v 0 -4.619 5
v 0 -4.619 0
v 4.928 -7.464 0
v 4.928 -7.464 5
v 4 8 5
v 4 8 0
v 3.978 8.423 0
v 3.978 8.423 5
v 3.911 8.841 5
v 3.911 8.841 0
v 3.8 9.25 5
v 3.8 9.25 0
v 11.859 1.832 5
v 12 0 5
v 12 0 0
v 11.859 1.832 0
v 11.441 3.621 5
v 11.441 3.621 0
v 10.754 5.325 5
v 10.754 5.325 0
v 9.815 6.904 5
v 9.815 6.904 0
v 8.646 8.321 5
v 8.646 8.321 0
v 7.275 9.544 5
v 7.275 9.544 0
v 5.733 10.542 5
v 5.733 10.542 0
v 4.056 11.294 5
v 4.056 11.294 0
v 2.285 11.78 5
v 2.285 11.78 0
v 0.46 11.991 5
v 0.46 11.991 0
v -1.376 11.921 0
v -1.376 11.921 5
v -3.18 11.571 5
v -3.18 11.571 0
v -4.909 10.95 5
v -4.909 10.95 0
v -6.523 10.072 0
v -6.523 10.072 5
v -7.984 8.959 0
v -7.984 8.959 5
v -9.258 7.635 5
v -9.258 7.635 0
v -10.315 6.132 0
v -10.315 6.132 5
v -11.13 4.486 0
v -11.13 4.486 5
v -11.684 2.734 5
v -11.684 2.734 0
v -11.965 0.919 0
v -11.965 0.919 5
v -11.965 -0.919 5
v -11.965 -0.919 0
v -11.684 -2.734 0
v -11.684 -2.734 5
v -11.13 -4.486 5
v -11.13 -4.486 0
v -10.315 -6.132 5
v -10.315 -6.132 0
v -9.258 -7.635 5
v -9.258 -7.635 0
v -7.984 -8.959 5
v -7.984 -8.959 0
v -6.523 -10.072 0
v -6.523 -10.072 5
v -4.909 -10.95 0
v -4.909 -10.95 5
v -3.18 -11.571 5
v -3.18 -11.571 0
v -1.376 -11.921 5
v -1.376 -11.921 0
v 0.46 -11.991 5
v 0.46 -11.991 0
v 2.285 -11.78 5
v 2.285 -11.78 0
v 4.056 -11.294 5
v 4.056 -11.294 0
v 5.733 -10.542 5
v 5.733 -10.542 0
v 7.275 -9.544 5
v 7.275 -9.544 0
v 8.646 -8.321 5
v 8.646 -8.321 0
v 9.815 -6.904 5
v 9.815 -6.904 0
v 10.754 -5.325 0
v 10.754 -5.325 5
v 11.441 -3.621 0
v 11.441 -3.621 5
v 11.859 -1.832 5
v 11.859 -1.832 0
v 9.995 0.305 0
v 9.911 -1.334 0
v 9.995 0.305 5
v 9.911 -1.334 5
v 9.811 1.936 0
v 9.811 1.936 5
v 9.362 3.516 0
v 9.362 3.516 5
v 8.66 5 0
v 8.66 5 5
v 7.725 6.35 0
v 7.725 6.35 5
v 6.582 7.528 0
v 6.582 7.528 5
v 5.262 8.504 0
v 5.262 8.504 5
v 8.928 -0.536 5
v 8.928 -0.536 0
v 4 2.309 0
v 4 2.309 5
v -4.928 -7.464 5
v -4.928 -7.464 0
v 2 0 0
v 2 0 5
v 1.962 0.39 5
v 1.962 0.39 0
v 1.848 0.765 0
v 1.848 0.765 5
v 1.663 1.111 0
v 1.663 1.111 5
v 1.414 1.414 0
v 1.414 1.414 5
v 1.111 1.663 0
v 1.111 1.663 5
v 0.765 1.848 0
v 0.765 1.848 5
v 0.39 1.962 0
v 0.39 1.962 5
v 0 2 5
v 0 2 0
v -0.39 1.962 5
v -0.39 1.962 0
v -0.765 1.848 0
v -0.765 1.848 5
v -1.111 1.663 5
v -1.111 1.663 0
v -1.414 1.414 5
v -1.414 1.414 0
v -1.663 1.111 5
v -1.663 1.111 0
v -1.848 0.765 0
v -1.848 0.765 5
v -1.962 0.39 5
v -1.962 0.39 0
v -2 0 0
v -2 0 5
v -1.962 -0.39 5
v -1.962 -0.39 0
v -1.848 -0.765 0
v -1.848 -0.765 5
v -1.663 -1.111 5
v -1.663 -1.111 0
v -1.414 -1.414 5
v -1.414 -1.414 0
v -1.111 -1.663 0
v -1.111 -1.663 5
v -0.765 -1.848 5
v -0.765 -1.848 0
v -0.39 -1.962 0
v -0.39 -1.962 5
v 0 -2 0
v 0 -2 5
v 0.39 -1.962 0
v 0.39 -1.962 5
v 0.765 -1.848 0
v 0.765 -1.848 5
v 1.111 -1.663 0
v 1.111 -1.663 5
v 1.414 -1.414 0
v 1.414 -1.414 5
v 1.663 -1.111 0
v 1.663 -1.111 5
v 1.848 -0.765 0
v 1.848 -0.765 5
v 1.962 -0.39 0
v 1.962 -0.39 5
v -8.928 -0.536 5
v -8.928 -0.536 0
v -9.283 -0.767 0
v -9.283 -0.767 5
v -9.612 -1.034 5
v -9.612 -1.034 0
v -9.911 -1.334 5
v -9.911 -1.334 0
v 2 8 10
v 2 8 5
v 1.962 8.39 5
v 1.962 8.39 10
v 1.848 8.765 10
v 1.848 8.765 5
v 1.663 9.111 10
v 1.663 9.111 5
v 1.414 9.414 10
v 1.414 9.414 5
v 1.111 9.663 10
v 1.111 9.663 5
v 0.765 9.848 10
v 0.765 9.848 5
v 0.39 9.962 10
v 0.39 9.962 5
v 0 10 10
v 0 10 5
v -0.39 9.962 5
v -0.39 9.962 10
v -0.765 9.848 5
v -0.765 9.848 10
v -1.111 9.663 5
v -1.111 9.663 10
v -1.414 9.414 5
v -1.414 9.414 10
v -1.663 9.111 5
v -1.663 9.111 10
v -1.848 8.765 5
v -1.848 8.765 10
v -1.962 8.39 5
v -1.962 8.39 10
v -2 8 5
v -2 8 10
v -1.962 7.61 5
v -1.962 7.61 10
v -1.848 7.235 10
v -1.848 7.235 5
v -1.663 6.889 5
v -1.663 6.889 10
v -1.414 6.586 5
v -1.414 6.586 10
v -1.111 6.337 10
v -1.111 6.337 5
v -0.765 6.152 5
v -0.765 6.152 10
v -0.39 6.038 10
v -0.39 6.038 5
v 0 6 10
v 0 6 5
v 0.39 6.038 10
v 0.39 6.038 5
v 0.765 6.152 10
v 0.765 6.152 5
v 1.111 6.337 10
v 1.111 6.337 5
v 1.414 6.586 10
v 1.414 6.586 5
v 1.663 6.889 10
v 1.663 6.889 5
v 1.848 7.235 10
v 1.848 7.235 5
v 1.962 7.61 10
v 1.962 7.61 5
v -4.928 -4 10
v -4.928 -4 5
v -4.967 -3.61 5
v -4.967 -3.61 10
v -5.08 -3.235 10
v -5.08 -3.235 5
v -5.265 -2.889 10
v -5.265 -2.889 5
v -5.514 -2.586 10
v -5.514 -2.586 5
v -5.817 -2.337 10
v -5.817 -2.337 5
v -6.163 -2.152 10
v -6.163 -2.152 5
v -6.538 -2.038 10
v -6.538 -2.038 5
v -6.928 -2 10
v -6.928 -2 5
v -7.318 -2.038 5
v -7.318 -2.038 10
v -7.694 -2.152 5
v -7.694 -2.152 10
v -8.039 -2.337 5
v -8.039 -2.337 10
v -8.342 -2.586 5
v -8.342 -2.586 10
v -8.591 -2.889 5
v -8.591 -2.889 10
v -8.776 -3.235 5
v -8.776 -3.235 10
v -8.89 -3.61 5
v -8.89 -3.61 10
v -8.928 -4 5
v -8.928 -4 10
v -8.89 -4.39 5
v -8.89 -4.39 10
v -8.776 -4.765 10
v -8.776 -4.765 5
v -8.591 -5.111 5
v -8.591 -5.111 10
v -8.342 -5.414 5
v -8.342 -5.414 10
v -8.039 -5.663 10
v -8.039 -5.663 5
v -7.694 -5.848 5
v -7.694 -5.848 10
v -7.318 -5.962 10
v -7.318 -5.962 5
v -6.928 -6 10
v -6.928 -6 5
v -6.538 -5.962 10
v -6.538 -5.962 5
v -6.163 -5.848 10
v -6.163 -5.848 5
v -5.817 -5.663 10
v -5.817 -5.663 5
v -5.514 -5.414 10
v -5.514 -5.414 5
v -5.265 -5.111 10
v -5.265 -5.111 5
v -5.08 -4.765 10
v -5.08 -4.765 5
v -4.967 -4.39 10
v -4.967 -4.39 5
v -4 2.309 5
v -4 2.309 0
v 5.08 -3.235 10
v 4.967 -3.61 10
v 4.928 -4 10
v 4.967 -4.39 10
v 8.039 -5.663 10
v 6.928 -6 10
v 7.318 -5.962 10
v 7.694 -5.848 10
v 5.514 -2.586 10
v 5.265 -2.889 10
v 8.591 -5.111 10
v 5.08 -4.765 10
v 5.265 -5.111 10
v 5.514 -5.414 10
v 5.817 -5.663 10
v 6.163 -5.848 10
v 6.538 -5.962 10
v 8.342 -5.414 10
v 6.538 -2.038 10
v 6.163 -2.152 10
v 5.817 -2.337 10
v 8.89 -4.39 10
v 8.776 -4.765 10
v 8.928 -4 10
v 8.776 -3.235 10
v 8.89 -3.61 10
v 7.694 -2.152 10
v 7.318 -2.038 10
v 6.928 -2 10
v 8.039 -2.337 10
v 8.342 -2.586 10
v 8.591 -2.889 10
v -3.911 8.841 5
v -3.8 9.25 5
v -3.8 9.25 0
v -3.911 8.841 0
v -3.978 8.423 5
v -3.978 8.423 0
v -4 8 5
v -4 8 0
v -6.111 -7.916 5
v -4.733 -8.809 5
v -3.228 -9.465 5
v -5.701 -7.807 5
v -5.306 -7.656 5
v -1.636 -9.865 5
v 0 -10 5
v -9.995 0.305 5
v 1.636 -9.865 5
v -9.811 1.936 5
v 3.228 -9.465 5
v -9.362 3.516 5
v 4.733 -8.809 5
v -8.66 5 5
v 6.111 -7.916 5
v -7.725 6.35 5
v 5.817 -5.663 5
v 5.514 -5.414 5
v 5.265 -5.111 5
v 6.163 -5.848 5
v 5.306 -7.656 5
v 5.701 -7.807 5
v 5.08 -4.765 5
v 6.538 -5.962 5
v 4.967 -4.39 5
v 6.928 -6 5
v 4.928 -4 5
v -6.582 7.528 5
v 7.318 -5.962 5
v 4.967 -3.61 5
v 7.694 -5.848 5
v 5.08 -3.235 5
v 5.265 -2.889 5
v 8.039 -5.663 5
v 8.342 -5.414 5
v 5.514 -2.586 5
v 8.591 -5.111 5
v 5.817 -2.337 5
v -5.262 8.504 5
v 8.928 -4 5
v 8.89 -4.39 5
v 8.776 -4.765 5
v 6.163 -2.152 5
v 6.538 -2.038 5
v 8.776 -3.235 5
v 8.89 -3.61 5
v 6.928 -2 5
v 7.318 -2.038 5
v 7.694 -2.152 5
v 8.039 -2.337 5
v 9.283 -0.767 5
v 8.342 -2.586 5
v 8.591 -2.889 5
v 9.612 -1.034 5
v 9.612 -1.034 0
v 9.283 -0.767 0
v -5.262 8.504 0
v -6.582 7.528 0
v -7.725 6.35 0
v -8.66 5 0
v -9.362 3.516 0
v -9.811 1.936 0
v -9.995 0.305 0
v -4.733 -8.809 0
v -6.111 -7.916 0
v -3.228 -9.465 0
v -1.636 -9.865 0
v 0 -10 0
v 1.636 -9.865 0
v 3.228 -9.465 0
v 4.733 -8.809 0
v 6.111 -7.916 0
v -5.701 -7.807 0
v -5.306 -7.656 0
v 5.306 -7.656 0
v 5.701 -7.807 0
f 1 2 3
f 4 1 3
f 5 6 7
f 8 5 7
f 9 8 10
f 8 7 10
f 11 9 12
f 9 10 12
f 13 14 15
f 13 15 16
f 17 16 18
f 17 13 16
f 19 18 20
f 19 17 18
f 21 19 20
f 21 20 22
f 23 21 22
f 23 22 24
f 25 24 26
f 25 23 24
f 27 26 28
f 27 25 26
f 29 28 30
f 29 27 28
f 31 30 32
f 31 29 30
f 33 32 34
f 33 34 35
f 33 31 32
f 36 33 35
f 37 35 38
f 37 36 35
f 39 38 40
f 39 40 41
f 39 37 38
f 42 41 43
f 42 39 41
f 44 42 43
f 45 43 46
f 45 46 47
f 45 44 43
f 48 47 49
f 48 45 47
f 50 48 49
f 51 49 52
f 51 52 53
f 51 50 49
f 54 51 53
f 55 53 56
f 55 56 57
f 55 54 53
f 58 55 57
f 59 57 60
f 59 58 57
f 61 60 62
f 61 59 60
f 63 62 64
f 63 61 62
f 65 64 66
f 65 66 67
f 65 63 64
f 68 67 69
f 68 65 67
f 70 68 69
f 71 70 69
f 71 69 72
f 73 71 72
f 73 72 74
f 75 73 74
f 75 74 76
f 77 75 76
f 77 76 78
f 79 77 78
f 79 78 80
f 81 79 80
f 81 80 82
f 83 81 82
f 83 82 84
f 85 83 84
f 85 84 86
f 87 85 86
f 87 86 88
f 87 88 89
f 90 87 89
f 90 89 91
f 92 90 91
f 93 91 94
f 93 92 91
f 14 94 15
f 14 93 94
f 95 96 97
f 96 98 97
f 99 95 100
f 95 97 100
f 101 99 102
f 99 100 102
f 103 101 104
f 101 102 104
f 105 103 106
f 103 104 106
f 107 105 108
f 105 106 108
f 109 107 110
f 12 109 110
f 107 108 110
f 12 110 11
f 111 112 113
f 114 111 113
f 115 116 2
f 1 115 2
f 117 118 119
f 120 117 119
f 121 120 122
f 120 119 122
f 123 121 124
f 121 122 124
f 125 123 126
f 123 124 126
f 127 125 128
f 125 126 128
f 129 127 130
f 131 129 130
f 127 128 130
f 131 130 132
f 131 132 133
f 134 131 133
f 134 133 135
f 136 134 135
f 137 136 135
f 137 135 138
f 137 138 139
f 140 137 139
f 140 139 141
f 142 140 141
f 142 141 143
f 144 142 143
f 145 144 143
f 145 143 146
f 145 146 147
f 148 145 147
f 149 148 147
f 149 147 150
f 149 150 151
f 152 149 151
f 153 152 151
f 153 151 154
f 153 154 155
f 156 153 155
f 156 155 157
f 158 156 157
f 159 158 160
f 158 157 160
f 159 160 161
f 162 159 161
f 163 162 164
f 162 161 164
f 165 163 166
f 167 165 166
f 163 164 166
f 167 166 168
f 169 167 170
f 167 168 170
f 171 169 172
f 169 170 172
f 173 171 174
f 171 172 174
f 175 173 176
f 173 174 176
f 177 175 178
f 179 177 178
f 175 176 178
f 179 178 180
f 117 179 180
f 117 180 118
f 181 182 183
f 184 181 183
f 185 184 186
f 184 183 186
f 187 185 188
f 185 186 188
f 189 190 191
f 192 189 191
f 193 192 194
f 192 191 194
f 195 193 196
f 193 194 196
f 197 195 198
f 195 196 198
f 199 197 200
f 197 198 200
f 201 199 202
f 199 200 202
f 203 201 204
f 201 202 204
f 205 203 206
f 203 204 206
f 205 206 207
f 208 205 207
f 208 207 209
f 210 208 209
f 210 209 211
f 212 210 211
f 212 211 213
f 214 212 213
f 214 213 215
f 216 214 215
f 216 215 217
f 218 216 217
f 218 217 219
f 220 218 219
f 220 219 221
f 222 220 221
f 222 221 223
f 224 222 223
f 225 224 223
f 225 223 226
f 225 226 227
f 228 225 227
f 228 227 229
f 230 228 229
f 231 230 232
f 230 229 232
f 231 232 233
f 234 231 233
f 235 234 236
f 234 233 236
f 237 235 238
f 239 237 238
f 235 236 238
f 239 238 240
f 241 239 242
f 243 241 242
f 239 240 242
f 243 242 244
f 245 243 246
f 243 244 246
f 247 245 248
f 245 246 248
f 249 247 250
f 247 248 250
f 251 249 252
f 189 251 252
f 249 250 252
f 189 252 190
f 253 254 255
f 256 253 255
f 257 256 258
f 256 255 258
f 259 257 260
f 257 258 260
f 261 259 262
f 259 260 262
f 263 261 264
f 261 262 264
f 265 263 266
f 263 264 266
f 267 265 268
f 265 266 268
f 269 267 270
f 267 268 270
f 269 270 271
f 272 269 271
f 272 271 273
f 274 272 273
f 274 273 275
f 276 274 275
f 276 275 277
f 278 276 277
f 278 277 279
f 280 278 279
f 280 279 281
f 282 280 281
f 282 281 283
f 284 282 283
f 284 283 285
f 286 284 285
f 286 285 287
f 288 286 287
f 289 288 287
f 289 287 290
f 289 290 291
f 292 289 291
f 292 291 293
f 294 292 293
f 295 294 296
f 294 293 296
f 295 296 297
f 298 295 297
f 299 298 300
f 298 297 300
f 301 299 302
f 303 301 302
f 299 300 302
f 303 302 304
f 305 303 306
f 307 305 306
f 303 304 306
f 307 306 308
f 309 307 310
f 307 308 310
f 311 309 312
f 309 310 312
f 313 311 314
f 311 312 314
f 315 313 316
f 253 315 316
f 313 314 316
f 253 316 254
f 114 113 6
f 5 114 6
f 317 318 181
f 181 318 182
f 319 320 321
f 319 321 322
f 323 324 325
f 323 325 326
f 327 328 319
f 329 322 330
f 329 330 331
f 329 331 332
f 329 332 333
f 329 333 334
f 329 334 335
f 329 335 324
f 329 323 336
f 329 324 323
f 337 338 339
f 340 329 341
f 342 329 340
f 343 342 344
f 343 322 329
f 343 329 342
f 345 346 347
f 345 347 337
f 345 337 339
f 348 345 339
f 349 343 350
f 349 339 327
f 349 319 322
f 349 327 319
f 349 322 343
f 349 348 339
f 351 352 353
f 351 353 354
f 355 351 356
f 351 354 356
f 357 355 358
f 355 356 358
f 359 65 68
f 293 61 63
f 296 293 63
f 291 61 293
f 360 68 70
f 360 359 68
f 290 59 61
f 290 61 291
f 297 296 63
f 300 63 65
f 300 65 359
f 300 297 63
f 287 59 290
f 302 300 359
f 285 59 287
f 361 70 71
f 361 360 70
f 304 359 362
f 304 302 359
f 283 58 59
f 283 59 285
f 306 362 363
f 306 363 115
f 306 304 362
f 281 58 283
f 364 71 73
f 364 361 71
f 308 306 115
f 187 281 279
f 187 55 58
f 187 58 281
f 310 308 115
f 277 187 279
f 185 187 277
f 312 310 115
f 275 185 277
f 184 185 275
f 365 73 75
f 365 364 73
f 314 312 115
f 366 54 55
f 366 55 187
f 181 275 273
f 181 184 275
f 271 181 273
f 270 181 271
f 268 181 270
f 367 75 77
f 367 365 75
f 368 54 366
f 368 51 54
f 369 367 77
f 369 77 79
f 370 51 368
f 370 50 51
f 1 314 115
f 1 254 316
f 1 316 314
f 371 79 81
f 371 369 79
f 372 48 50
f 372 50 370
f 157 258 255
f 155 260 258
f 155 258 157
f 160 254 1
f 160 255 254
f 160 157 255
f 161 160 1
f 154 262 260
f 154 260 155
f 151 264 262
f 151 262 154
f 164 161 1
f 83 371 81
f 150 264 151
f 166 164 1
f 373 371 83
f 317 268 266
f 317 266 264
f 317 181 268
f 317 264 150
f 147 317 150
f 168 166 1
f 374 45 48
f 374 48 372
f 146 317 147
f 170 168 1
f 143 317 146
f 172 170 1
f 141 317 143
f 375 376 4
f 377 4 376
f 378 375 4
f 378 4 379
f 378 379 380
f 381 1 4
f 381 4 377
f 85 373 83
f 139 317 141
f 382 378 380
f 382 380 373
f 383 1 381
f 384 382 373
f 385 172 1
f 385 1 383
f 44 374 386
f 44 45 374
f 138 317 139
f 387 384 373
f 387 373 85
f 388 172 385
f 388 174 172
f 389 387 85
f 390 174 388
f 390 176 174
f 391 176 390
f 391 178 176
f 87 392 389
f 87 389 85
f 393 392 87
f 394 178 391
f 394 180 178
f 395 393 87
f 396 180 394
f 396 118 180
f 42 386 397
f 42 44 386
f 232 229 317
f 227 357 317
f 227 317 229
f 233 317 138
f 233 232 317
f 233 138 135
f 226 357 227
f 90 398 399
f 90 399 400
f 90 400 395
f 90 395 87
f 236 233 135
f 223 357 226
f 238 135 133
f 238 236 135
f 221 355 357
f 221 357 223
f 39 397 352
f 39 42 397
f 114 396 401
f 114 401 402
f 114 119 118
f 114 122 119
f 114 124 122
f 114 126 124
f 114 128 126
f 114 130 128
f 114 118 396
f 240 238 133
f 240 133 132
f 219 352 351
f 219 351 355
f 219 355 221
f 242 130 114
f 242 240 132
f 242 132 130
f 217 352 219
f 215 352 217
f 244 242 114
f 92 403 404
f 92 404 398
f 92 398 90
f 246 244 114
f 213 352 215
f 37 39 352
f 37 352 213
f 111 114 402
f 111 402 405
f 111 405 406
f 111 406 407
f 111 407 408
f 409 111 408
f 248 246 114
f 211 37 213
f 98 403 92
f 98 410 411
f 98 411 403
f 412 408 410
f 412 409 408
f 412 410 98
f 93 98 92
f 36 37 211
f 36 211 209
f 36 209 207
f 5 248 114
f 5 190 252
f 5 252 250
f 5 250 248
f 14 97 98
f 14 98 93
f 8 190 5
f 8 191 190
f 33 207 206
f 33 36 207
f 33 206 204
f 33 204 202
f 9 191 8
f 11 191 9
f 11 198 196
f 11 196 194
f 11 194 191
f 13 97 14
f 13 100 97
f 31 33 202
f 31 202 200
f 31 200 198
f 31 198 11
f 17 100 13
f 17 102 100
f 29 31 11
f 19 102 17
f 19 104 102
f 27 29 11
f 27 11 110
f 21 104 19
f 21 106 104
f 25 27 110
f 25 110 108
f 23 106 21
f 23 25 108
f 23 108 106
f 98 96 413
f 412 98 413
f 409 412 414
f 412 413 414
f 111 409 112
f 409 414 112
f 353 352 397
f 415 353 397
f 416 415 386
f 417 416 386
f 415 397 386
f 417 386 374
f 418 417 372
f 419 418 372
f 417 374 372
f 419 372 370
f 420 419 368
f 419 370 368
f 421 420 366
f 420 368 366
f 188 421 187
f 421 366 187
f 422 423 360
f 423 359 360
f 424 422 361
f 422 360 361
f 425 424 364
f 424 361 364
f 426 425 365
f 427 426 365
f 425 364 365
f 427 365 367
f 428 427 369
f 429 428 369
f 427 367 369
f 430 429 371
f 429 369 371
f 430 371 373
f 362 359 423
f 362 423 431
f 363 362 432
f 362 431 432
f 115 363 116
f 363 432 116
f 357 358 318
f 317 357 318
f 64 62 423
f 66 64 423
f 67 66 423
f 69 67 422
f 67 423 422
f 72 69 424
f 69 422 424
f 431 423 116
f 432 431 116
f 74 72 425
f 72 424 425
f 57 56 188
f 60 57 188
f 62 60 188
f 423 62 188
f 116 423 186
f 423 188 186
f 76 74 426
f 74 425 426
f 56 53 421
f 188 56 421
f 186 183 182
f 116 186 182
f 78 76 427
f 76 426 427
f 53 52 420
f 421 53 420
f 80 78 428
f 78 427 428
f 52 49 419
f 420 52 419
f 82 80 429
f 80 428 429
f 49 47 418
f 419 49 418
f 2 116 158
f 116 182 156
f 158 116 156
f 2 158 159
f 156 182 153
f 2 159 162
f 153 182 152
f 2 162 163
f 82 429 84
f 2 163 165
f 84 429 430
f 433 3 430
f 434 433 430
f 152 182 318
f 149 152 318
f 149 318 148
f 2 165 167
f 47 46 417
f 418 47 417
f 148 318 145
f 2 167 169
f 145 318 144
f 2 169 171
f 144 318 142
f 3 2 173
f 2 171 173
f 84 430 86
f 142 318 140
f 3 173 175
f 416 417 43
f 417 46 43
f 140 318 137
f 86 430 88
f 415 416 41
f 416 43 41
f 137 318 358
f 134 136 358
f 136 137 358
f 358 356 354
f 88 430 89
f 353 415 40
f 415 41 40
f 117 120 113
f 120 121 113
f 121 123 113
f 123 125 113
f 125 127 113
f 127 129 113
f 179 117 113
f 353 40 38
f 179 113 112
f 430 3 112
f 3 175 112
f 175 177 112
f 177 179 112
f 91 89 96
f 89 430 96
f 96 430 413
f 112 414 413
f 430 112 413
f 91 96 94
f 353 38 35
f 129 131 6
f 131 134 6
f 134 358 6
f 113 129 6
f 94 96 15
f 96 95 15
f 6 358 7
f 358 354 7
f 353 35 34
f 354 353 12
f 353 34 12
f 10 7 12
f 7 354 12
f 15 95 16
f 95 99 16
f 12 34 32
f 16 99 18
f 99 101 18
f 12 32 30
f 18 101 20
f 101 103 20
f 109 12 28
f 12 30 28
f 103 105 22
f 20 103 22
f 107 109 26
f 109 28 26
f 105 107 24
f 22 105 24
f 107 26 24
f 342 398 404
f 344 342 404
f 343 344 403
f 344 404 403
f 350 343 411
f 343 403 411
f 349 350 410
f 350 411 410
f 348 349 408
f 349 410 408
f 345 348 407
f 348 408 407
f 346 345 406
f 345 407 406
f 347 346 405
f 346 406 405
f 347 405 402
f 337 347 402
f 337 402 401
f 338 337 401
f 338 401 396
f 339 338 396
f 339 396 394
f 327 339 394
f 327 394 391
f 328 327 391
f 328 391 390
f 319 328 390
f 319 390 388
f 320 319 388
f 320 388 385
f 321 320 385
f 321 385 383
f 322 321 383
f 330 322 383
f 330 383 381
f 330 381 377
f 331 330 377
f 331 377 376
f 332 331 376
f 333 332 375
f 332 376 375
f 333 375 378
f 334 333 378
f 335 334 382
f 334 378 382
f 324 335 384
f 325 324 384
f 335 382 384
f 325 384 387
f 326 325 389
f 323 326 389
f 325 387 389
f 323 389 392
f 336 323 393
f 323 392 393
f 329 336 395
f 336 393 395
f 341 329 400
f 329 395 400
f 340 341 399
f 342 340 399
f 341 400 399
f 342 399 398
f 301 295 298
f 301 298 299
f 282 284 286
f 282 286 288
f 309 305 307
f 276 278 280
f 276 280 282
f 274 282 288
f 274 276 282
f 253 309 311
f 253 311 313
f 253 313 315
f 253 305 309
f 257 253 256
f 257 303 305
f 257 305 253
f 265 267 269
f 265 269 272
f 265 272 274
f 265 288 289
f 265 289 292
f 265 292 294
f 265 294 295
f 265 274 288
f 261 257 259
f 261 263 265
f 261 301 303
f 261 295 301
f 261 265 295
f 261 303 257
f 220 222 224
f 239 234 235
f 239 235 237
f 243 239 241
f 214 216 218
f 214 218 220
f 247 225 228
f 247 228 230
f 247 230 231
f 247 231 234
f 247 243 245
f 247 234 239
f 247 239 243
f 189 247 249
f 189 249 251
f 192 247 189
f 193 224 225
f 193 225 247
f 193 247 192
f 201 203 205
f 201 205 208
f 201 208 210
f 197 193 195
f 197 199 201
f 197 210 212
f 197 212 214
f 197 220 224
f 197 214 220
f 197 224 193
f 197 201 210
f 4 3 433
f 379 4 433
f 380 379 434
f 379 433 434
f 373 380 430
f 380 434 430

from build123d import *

# Parameters (mm, degrees)
BOSS_EXTRUDE1_DEPTH     = 5
SKETCH3_R               = 2
BOSS_EXTRUDE2_DEPTH     = 5
SKETCH4_R               = 2
CUT_EXTRUDE1_DEPTH      = 6
CUT_EXTRUDE1_DEPTH_BACK = 6
SKETCH5_R               = 12
SKETCH5_R_2             = 10
BOSS_EXTRUDE3_DEPTH     = 5


with BuildPart() as part:
    # Sketch1 → Boss-Extrude1 (new body)
    with BuildSketch(Plane.XY):
        with BuildLine():
            Line((4, 2.309401077), (4, 8))
            ThreePointArc((4, 8), (0, 12), (-4, 8))
            Line((-4, 8), (-4, 2.309401077))
            Line((-4, 2.309401077), (-8.92820323, -0.535898385))
            ThreePointArc((-8.92820323, -0.535898385), (-10.392304845, -6), (-4.92820323, -7.464101615))
            Line((-4.92820323, -7.464101615), (0, -4.618802154))
            Line((0, -4.618802154), (4.92820323, -7.464101615))
            ThreePointArc((4.92820323, -7.464101615), (10.392304845, -6), (8.92820323, -0.535898385))
            Line((8.92820323, -0.535898385), (4, 2.309401077))
        make_face()
    extrude(amount=BOSS_EXTRUDE1_DEPTH)

    # Sketch3 → Boss-Extrude2 (add)
    with BuildSketch(Plane.XY.offset(5)):
        with Locations((0, 8)):
            Circle(SKETCH3_R)
        with Locations((6.92820323, -4)):
            Circle(SKETCH3_R)
        with Locations((-6.92820323, -4)):
            Circle(SKETCH3_R)
        Circle(SKETCH3_R)
    extrude(amount=BOSS_EXTRUDE2_DEPTH)

    # Sketch4 → Cut-Extrude1 (cut, two sides)
    with BuildSketch(Plane.XY.offset(5)) as cut_extrude1_sk:
        Circle(SKETCH4_R)
    extrude(amount=CUT_EXTRUDE1_DEPTH, mode=Mode.SUBTRACT)
    extrude(cut_extrude1_sk.sketch, amount=-CUT_EXTRUDE1_DEPTH_BACK, mode=Mode.SUBTRACT)

    # Sketch5 → Boss-Extrude3 (add)
    with BuildSketch(Plane.XY.offset(5)):
        Circle(SKETCH5_R)
        Circle(SKETCH5_R_2, mode=Mode.SUBTRACT)
    extrude(amount=-BOSS_EXTRUDE3_DEPTH)


solid = part.part
